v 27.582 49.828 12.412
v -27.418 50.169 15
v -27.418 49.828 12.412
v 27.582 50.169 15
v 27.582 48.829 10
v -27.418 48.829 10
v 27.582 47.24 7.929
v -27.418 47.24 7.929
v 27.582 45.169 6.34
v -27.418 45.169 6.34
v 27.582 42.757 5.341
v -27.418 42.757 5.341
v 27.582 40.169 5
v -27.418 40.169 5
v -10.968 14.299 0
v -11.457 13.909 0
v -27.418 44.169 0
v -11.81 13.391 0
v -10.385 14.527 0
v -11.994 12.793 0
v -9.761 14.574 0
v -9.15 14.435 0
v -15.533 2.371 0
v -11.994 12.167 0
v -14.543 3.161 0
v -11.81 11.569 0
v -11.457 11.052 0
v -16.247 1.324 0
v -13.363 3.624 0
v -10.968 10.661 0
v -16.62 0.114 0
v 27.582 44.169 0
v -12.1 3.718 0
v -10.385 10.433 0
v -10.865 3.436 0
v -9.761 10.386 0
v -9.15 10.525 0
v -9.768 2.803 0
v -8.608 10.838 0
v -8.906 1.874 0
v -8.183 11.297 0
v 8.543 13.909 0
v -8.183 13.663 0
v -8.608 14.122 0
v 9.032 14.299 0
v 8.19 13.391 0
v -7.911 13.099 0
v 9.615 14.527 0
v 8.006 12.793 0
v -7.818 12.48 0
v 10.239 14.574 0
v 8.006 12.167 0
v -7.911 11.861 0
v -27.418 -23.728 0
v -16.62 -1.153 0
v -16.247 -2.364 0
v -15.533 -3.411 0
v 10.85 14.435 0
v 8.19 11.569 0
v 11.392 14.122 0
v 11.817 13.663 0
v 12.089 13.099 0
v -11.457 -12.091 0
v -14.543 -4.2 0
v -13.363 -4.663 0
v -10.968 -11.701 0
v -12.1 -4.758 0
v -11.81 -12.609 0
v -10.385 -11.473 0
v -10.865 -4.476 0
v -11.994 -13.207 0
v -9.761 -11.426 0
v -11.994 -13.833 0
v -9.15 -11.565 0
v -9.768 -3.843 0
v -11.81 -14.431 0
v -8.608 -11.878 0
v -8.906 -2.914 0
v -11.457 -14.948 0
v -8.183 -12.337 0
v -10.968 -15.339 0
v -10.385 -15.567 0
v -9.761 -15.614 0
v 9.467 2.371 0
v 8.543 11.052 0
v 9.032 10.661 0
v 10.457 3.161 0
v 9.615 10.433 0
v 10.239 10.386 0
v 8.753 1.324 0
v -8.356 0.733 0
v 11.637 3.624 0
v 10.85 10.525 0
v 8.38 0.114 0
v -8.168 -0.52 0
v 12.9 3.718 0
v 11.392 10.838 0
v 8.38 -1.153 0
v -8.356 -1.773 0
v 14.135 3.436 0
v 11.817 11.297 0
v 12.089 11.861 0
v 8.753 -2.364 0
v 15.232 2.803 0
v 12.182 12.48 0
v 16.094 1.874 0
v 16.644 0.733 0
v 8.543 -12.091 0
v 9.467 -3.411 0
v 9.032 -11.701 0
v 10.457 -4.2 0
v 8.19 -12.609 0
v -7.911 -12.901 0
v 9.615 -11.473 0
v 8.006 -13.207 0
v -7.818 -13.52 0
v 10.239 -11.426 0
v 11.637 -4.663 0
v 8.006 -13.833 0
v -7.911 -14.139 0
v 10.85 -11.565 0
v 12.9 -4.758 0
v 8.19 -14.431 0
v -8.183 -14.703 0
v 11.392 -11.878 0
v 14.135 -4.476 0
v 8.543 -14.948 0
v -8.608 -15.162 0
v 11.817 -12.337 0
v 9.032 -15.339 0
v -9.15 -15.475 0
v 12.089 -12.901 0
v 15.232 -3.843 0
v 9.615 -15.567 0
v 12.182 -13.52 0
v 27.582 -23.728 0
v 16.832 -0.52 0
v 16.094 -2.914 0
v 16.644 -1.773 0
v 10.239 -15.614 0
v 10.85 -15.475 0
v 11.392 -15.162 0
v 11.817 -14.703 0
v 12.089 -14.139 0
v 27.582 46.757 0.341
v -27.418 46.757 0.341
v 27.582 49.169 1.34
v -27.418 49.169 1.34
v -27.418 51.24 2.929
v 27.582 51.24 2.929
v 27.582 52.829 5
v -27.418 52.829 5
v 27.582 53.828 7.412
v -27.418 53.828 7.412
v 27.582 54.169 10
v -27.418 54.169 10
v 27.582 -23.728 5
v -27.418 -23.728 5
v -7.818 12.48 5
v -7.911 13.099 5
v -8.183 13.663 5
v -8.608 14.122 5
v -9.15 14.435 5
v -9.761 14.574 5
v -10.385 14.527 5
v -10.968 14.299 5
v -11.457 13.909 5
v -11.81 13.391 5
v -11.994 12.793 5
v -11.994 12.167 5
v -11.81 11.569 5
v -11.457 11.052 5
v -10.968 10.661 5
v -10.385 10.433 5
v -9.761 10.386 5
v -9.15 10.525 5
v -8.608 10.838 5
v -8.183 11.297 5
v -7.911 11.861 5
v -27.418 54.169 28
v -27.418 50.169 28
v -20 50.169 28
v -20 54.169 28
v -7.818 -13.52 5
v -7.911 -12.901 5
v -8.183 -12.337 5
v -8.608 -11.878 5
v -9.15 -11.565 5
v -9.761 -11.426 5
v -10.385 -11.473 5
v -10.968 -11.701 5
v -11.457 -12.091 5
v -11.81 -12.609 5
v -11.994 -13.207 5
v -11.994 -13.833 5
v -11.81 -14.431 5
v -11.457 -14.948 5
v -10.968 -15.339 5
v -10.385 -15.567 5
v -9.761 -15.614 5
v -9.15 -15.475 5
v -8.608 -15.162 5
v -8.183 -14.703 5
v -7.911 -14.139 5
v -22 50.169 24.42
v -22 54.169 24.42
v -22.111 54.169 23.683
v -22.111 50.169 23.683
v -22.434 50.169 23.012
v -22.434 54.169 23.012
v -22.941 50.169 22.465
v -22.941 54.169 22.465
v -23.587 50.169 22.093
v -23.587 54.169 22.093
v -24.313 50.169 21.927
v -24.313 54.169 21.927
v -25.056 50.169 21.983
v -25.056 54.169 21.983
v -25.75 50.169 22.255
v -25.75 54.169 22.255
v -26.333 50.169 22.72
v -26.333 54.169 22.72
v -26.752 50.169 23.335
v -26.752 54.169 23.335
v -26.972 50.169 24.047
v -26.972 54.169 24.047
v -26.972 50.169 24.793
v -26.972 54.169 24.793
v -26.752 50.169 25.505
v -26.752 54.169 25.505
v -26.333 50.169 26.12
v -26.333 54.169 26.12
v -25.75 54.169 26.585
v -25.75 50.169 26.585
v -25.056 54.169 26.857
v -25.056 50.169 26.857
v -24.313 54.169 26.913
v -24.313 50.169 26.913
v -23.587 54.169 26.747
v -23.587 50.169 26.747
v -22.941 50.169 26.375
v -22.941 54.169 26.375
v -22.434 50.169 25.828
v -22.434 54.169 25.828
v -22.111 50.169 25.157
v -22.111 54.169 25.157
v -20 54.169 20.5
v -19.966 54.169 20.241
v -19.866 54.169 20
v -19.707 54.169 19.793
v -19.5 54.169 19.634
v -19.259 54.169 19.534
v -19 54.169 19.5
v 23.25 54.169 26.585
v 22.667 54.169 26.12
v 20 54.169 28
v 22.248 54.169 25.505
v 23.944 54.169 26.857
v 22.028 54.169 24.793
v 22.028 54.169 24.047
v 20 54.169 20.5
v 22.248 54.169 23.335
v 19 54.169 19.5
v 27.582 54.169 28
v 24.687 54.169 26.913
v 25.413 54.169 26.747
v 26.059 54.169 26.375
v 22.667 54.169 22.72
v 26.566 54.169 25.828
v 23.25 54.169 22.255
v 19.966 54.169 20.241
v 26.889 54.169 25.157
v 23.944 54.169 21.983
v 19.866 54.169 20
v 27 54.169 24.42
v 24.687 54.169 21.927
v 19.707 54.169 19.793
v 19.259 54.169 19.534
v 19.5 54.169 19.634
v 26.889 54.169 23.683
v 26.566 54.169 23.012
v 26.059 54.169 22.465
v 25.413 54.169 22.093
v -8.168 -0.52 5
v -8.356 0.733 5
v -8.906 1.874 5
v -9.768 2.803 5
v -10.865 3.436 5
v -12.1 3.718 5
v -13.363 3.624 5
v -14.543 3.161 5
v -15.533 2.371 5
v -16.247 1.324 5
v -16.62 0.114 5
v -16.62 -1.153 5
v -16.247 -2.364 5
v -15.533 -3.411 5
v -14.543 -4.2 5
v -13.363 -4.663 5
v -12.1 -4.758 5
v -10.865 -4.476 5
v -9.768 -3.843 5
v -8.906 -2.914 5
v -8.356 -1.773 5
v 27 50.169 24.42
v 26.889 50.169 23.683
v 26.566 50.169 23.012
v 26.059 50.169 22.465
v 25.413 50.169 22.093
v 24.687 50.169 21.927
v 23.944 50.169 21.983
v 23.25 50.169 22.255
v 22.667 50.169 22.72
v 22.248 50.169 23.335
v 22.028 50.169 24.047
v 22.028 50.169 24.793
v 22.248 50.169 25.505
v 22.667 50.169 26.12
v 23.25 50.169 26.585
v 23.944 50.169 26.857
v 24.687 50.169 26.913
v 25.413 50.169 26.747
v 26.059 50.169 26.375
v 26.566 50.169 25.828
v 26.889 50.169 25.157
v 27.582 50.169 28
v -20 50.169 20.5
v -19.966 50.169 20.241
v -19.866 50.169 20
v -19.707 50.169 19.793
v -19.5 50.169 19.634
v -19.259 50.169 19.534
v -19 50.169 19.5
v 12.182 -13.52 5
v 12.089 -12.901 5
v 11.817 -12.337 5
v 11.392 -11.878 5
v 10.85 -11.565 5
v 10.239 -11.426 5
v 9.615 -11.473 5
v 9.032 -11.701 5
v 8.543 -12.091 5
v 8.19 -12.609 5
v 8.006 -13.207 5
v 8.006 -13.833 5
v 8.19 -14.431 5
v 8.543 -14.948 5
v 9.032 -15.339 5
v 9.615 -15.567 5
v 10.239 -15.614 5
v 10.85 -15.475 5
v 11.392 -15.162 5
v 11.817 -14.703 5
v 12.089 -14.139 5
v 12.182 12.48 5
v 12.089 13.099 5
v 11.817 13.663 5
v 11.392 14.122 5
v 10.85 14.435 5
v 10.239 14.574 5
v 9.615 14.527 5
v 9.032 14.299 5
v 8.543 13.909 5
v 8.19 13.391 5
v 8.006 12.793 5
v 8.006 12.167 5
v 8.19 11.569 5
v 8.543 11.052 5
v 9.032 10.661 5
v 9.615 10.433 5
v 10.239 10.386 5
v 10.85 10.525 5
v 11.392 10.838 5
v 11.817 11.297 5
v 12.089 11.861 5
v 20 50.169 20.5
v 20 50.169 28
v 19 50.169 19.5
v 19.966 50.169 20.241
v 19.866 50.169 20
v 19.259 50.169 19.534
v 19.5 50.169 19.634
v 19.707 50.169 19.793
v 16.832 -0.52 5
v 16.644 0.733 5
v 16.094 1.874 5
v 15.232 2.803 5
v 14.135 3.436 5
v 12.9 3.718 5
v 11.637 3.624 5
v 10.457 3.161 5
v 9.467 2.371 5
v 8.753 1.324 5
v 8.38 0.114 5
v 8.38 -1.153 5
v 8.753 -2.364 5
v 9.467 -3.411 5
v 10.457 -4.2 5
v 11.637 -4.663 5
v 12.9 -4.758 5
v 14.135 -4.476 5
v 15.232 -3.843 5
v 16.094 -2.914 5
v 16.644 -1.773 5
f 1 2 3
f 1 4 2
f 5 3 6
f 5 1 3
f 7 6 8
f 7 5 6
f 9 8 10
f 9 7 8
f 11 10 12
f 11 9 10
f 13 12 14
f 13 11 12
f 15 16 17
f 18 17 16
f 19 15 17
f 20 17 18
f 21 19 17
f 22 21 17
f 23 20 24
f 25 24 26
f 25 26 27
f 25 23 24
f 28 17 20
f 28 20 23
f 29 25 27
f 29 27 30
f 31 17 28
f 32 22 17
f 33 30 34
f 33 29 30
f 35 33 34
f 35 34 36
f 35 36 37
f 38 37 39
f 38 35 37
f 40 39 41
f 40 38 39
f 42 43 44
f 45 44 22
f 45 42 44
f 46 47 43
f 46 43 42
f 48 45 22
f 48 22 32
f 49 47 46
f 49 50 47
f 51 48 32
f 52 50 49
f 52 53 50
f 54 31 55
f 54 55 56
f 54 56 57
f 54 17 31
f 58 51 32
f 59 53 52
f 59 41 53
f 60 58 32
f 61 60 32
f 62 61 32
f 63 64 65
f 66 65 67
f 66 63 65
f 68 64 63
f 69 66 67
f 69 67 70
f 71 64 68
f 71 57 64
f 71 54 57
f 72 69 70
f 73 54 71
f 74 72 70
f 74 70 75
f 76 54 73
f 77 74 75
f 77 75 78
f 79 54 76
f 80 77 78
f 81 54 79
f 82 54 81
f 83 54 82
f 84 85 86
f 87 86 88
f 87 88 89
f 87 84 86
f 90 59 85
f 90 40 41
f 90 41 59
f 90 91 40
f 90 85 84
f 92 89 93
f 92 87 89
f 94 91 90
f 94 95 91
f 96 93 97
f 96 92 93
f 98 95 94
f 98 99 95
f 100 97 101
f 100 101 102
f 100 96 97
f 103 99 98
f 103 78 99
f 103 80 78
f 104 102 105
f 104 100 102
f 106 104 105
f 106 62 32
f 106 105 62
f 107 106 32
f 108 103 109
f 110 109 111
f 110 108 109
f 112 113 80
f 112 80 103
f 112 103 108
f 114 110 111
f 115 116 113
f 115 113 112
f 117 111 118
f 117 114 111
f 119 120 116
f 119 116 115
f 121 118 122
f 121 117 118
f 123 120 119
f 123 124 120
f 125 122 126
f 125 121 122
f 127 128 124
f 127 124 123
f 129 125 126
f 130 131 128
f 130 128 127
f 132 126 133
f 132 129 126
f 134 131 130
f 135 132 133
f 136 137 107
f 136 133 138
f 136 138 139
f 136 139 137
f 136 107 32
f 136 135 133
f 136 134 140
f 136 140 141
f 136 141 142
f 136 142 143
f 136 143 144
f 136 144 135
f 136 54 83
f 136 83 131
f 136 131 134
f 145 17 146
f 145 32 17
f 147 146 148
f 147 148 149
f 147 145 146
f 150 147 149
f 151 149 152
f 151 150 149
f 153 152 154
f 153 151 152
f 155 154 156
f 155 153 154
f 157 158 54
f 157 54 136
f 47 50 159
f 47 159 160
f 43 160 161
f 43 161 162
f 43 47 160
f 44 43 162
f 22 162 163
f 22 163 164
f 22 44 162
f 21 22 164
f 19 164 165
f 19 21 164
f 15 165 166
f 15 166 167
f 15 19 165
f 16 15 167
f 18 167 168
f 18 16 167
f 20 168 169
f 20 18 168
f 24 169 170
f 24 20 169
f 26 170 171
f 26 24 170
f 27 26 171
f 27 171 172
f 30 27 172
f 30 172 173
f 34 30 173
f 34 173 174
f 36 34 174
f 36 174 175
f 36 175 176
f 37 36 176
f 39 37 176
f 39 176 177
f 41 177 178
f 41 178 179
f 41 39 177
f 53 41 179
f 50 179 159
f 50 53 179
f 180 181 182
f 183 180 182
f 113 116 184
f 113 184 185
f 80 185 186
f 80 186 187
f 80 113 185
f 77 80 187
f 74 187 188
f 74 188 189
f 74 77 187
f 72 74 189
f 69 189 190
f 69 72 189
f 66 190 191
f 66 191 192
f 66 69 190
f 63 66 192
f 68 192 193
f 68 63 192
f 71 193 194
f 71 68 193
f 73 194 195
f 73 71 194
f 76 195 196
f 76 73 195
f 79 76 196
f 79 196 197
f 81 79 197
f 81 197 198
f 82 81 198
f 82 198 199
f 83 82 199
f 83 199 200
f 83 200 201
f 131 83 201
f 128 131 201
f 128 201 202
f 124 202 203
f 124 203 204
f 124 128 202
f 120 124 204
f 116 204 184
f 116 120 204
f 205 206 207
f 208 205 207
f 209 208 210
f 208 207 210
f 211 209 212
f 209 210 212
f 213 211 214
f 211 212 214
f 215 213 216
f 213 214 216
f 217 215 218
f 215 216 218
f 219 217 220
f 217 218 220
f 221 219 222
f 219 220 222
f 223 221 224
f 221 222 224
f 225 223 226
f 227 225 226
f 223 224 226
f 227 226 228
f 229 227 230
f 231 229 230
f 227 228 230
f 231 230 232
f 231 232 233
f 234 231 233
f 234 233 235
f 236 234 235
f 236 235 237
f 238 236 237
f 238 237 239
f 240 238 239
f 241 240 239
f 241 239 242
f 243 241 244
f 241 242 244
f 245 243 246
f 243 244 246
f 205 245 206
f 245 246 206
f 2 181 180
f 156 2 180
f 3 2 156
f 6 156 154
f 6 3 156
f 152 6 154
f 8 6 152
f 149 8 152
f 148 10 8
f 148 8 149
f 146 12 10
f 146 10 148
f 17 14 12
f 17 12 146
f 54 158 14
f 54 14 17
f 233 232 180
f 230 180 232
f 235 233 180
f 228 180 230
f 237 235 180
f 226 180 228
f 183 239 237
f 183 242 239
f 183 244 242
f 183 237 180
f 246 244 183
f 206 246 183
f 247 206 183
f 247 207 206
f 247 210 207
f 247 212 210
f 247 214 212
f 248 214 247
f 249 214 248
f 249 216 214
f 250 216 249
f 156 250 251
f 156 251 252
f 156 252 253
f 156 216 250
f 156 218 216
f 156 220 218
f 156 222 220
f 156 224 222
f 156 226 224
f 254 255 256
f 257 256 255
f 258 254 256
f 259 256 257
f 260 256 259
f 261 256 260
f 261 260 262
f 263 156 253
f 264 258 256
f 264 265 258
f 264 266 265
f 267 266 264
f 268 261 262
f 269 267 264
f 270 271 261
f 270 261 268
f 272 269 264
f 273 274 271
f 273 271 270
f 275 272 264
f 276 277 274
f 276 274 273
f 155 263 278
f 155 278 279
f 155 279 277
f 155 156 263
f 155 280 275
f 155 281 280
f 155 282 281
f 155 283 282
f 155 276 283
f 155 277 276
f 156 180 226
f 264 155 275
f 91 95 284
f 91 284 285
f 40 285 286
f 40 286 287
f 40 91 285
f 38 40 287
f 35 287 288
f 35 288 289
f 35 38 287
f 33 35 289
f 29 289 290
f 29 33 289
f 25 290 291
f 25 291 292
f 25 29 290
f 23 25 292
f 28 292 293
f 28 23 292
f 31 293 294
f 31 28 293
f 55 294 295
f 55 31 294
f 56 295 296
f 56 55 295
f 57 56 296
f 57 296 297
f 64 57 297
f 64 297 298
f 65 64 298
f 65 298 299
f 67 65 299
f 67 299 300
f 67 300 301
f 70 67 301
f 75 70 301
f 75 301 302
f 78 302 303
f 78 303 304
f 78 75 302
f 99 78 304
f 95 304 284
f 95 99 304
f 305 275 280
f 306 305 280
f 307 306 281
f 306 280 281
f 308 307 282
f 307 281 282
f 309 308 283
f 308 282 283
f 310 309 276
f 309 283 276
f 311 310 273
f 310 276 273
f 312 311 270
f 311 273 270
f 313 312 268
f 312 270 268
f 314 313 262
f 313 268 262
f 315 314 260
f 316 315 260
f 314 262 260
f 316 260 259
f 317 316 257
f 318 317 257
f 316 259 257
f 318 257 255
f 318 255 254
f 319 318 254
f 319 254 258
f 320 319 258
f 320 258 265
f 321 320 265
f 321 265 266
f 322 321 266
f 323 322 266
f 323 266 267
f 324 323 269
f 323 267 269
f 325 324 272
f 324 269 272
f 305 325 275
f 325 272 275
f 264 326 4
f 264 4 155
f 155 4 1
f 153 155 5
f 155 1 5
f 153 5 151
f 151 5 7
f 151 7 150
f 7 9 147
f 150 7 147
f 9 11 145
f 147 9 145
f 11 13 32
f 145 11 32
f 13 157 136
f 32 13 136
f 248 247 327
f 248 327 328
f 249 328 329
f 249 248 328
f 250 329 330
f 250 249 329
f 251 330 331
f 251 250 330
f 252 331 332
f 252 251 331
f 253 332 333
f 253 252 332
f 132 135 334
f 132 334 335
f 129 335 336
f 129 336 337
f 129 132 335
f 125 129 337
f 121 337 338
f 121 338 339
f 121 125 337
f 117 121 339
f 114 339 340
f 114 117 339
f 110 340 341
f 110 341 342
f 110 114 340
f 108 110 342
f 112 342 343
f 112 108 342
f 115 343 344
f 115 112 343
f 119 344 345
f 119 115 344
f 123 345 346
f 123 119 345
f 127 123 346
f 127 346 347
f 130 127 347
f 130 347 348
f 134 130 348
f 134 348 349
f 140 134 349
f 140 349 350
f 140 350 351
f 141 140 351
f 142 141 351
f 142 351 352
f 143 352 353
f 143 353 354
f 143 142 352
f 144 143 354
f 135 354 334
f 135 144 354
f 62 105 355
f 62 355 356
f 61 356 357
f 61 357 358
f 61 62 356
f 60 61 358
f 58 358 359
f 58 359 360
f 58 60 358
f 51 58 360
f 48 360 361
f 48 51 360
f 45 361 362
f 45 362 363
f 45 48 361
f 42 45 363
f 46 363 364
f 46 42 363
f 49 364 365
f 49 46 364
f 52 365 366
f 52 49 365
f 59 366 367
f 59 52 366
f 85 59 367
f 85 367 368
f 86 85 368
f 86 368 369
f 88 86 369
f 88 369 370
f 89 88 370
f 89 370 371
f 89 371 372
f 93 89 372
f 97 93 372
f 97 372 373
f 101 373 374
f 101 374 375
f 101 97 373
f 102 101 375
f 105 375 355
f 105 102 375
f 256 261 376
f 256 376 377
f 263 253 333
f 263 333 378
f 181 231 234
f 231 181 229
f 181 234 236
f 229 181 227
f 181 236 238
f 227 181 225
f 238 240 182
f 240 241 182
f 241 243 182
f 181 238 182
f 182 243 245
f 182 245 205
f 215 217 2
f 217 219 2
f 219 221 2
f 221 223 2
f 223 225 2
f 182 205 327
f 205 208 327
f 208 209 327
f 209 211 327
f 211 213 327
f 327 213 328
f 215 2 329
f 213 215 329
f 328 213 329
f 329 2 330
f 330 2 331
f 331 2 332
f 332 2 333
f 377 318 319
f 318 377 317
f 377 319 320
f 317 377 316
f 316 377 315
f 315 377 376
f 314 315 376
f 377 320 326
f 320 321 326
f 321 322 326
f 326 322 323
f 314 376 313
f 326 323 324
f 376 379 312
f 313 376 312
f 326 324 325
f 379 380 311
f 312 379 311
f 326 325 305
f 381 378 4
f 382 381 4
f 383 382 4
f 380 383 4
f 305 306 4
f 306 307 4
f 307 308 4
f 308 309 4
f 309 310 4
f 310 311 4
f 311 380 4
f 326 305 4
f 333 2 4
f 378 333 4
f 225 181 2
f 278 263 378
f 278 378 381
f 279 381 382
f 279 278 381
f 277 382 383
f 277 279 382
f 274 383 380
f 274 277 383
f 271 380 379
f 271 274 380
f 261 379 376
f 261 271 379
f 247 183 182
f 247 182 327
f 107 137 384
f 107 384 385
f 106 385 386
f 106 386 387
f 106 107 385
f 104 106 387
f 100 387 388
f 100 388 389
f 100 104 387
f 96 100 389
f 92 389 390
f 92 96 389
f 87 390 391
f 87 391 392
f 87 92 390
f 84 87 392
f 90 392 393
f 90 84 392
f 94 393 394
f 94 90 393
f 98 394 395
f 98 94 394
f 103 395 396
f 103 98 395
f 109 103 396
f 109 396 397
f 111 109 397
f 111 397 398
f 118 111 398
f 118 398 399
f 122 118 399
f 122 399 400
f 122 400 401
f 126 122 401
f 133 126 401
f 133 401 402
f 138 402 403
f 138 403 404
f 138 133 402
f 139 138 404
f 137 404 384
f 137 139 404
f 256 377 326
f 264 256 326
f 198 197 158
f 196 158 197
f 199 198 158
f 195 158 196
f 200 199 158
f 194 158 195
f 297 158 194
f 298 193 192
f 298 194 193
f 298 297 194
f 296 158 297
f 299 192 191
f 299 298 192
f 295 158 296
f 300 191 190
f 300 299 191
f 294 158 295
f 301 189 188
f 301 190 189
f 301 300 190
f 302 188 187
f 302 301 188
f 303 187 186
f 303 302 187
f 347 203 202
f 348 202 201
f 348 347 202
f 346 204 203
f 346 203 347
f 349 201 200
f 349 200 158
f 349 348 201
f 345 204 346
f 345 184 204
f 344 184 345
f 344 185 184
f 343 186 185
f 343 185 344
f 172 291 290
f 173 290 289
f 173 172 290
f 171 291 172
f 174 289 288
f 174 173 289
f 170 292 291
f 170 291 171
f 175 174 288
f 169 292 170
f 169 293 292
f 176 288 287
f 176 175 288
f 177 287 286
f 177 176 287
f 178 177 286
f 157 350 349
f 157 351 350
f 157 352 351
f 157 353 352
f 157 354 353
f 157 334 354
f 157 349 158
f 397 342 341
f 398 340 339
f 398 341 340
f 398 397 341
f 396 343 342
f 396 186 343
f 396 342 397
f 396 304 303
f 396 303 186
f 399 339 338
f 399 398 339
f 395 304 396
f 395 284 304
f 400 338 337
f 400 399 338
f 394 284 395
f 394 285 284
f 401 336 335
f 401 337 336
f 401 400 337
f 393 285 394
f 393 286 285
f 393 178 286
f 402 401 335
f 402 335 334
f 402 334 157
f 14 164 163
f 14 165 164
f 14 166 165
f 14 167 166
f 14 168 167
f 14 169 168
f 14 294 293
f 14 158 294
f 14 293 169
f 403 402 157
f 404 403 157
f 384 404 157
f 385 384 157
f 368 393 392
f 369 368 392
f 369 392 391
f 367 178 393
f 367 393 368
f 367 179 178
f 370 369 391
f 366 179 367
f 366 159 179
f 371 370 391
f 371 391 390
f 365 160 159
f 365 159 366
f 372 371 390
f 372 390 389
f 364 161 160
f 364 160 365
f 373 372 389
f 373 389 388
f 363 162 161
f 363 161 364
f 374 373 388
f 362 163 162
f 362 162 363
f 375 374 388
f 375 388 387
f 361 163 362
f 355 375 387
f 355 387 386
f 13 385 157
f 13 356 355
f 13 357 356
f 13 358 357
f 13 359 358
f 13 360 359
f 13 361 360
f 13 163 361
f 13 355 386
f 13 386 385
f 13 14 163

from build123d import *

# Parameters (mm, degrees)
SKETCH1_R               = 4.25
SKETCH1_R_2             = 2.1
BOSS_EXTRUDE1_DEPTH     = 5
SKETCH2_W               = 23
SKETCH2_H               = 60
CUT_EXTRUDE1_DEPTH      = 10
FILLET1_R               = 5
FILLET2_R               = 5
ESQUISSE1_W             = 61.110635513
ESQUISSE1_H             = 10.431484261
ENL_V_MAT_EXTRU_1_DEPTH = 10
ESQUISSE5_W             = 55
ESQUISSE5_H             = 5
BOSS_EXTRU_3_DEPTH      = 20
BOSS_EXTRU_3_DEPTH_BACK = 9
ESQUISSE6_W             = 55
ESQUISSE6_H             = 28
BOSS_EXTRU_4_DEPTH      = 4
CONG_2_R                = 10
ESQUISSE11_R            = 2.5
ENL_V_MAT_EXTRU_2_DEPTH = 4


with BuildPart() as part:
    # Sketch1 → Boss-Extrude1 (new body)
    with BuildSketch(Plane.XY):
        with BuildLine():
            Line((-50.417601538, -29.831415105), (-27.417601538, -29.831415105))
            ThreePointArc((-27.417601538, -29.831415105), (0.082398462, -23.727510052), (27.582398462, -29.831415105))
            Line((27.582398462, -29.831415105), (50.582398462, -29.831415105))
            Line((50.582398462, -29.831415105), (50.582398462, 25.168584895))
            ThreePointArc((50.582398462, 25.168584895), (49.117932367, 28.704118801), (45.582398462, 30.168584895))
            Line((45.582398462, 30.168584895), (-45.417601538, 30.168584895))
            ThreePointArc((-45.417601538, 30.168584895), (-48.953135444, 28.704118801), (-50.417601538, 25.168584895))
            Line((-50.417601538, 25.168584895), (-50.417601538, -29.831415105))
        make_face()
        with Locations((12.582398462, -0.519851907)):
            Circle(SKETCH1_R, mode=Mode.SUBTRACT)
        with Locations((10.082398462, -13.519851907)):
            Circle(SKETCH1_R_2, mode=Mode.SUBTRACT)
        with Locations((-9.917601538, -13.519851907)):
            Circle(SKETCH1_R_2, mode=Mode.SUBTRACT)
        with Locations((-12.417601538, -0.519851907)):
            Circle(SKETCH1_R, mode=Mode.SUBTRACT)
        with Locations((-9.917601538, 12.480148093)):
            Circle(SKETCH1_R_2, mode=Mode.SUBTRACT)
        with Locations((10.082398462, 12.480148093)):
            Circle(SKETCH1_R_2, mode=Mode.SUBTRACT)
    extrude(amount=BOSS_EXTRUDE1_DEPTH)

    # Sketch2 → Cut-Extrude1 (cut)
    with BuildSketch(Plane.XY.offset(5)):
        with Locations((-38.917601538, 0.168584895)):
            Rectangle(SKETCH2_W, SKETCH2_H)
        with Locations((39.082398462, 0.168584895)):
            Rectangle(SKETCH2_W, SKETCH2_H)
    extrude(amount=-CUT_EXTRUDE1_DEPTH, mode=Mode.SUBTRACT)

    # Fillet1
    fillet1_edges = [part.edges().sort_by_distance(p)[0] for p in [
        (27.582398462, 30.168584895, 2.5),
    ]]
    fillet(fillet1_edges, radius=FILLET1_R)

    # Fillet2
    fillet2_edges = [part.edges().sort_by_distance(p)[0] for p in [
        (-27.417601538, 30.168584895, 2.5),
    ]]
    fillet(fillet2_edges, radius=FILLET2_R)

    # Esquisse1 → Enlèv. mat.-Extru.1 (cut)
    with BuildSketch(Plane.XY.offset(5)):
        with Locations((0.082398462, -28.943252183)):
            Rectangle(ESQUISSE1_W, ESQUISSE1_H)
    extrude(amount=-ENL_V_MAT_EXTRU_1_DEPTH, mode=Mode.SUBTRACT)

    # Esquisse5 → Boss.-Extru.3 (add, two sides)
    with BuildSketch(Plane(origin=(0, 30.168584895, 0), x_dir=(1, 0, 0), z_dir=(0, 1, 0))) as boss_extru_3_sk:
        with Locations((0.082398462, -2.5)):
            Rectangle(ESQUISSE5_W, ESQUISSE5_H)
    extrude(amount=BOSS_EXTRU_3_DEPTH)
    extrude(boss_extru_3_sk.sketch, amount=-BOSS_EXTRU_3_DEPTH_BACK)

    # Esquisse6 → Boss.-Extru.4 (add)
    with BuildSketch(Plane(origin=(0, 50.168584895, 0), x_dir=(1, 0, 0), z_dir=(0, 1, 0))):
        with Locations((0.082398462, -14)):
            Rectangle(ESQUISSE6_W, ESQUISSE6_H)
    extrude(amount=BOSS_EXTRU_4_DEPTH)

    # Congé2
    cong_2_edges = [part.edges().sort_by_distance(p)[0] for p in [
        (0.082398462, 50.168584895, 5),
        (0.082398462, 54.168584895, 0),
    ]]
    fillet(cong_2_edges, radius=CONG_2_R)

    # Esquisse11 → Enlèv. mat.-Extru.2 (cut)
    with BuildSketch(Plane(origin=(0, 54.168584895, 0), x_dir=(1, 0, 0), z_dir=(0, 1, 0))):
        with Locations((-24.5, -24.42)):
            Circle(ESQUISSE11_R)
        with Locations((24.5, -24.42)):
            Circle(ESQUISSE11_R)
        with BuildLine():
            Line((-19, -19.5), (19, -19.5))
            ThreePointArc((19, -19.5), (19.707106781, -19.792893219), (20, -20.5))
            Line((20, -20.5), (20, -40.5))
            Line((20, -40.5), (-20, -40.5))
            Line((-20, -40.5), (-20, -20.5))
            ThreePointArc((-20, -20.5), (-19.707106781, -19.792893219), (-19, -19.5))
        make_face()
    extrude(amount=-ENL_V_MAT_EXTRU_2_DEPTH, mode=Mode.SUBTRACT)


solid = part.part
